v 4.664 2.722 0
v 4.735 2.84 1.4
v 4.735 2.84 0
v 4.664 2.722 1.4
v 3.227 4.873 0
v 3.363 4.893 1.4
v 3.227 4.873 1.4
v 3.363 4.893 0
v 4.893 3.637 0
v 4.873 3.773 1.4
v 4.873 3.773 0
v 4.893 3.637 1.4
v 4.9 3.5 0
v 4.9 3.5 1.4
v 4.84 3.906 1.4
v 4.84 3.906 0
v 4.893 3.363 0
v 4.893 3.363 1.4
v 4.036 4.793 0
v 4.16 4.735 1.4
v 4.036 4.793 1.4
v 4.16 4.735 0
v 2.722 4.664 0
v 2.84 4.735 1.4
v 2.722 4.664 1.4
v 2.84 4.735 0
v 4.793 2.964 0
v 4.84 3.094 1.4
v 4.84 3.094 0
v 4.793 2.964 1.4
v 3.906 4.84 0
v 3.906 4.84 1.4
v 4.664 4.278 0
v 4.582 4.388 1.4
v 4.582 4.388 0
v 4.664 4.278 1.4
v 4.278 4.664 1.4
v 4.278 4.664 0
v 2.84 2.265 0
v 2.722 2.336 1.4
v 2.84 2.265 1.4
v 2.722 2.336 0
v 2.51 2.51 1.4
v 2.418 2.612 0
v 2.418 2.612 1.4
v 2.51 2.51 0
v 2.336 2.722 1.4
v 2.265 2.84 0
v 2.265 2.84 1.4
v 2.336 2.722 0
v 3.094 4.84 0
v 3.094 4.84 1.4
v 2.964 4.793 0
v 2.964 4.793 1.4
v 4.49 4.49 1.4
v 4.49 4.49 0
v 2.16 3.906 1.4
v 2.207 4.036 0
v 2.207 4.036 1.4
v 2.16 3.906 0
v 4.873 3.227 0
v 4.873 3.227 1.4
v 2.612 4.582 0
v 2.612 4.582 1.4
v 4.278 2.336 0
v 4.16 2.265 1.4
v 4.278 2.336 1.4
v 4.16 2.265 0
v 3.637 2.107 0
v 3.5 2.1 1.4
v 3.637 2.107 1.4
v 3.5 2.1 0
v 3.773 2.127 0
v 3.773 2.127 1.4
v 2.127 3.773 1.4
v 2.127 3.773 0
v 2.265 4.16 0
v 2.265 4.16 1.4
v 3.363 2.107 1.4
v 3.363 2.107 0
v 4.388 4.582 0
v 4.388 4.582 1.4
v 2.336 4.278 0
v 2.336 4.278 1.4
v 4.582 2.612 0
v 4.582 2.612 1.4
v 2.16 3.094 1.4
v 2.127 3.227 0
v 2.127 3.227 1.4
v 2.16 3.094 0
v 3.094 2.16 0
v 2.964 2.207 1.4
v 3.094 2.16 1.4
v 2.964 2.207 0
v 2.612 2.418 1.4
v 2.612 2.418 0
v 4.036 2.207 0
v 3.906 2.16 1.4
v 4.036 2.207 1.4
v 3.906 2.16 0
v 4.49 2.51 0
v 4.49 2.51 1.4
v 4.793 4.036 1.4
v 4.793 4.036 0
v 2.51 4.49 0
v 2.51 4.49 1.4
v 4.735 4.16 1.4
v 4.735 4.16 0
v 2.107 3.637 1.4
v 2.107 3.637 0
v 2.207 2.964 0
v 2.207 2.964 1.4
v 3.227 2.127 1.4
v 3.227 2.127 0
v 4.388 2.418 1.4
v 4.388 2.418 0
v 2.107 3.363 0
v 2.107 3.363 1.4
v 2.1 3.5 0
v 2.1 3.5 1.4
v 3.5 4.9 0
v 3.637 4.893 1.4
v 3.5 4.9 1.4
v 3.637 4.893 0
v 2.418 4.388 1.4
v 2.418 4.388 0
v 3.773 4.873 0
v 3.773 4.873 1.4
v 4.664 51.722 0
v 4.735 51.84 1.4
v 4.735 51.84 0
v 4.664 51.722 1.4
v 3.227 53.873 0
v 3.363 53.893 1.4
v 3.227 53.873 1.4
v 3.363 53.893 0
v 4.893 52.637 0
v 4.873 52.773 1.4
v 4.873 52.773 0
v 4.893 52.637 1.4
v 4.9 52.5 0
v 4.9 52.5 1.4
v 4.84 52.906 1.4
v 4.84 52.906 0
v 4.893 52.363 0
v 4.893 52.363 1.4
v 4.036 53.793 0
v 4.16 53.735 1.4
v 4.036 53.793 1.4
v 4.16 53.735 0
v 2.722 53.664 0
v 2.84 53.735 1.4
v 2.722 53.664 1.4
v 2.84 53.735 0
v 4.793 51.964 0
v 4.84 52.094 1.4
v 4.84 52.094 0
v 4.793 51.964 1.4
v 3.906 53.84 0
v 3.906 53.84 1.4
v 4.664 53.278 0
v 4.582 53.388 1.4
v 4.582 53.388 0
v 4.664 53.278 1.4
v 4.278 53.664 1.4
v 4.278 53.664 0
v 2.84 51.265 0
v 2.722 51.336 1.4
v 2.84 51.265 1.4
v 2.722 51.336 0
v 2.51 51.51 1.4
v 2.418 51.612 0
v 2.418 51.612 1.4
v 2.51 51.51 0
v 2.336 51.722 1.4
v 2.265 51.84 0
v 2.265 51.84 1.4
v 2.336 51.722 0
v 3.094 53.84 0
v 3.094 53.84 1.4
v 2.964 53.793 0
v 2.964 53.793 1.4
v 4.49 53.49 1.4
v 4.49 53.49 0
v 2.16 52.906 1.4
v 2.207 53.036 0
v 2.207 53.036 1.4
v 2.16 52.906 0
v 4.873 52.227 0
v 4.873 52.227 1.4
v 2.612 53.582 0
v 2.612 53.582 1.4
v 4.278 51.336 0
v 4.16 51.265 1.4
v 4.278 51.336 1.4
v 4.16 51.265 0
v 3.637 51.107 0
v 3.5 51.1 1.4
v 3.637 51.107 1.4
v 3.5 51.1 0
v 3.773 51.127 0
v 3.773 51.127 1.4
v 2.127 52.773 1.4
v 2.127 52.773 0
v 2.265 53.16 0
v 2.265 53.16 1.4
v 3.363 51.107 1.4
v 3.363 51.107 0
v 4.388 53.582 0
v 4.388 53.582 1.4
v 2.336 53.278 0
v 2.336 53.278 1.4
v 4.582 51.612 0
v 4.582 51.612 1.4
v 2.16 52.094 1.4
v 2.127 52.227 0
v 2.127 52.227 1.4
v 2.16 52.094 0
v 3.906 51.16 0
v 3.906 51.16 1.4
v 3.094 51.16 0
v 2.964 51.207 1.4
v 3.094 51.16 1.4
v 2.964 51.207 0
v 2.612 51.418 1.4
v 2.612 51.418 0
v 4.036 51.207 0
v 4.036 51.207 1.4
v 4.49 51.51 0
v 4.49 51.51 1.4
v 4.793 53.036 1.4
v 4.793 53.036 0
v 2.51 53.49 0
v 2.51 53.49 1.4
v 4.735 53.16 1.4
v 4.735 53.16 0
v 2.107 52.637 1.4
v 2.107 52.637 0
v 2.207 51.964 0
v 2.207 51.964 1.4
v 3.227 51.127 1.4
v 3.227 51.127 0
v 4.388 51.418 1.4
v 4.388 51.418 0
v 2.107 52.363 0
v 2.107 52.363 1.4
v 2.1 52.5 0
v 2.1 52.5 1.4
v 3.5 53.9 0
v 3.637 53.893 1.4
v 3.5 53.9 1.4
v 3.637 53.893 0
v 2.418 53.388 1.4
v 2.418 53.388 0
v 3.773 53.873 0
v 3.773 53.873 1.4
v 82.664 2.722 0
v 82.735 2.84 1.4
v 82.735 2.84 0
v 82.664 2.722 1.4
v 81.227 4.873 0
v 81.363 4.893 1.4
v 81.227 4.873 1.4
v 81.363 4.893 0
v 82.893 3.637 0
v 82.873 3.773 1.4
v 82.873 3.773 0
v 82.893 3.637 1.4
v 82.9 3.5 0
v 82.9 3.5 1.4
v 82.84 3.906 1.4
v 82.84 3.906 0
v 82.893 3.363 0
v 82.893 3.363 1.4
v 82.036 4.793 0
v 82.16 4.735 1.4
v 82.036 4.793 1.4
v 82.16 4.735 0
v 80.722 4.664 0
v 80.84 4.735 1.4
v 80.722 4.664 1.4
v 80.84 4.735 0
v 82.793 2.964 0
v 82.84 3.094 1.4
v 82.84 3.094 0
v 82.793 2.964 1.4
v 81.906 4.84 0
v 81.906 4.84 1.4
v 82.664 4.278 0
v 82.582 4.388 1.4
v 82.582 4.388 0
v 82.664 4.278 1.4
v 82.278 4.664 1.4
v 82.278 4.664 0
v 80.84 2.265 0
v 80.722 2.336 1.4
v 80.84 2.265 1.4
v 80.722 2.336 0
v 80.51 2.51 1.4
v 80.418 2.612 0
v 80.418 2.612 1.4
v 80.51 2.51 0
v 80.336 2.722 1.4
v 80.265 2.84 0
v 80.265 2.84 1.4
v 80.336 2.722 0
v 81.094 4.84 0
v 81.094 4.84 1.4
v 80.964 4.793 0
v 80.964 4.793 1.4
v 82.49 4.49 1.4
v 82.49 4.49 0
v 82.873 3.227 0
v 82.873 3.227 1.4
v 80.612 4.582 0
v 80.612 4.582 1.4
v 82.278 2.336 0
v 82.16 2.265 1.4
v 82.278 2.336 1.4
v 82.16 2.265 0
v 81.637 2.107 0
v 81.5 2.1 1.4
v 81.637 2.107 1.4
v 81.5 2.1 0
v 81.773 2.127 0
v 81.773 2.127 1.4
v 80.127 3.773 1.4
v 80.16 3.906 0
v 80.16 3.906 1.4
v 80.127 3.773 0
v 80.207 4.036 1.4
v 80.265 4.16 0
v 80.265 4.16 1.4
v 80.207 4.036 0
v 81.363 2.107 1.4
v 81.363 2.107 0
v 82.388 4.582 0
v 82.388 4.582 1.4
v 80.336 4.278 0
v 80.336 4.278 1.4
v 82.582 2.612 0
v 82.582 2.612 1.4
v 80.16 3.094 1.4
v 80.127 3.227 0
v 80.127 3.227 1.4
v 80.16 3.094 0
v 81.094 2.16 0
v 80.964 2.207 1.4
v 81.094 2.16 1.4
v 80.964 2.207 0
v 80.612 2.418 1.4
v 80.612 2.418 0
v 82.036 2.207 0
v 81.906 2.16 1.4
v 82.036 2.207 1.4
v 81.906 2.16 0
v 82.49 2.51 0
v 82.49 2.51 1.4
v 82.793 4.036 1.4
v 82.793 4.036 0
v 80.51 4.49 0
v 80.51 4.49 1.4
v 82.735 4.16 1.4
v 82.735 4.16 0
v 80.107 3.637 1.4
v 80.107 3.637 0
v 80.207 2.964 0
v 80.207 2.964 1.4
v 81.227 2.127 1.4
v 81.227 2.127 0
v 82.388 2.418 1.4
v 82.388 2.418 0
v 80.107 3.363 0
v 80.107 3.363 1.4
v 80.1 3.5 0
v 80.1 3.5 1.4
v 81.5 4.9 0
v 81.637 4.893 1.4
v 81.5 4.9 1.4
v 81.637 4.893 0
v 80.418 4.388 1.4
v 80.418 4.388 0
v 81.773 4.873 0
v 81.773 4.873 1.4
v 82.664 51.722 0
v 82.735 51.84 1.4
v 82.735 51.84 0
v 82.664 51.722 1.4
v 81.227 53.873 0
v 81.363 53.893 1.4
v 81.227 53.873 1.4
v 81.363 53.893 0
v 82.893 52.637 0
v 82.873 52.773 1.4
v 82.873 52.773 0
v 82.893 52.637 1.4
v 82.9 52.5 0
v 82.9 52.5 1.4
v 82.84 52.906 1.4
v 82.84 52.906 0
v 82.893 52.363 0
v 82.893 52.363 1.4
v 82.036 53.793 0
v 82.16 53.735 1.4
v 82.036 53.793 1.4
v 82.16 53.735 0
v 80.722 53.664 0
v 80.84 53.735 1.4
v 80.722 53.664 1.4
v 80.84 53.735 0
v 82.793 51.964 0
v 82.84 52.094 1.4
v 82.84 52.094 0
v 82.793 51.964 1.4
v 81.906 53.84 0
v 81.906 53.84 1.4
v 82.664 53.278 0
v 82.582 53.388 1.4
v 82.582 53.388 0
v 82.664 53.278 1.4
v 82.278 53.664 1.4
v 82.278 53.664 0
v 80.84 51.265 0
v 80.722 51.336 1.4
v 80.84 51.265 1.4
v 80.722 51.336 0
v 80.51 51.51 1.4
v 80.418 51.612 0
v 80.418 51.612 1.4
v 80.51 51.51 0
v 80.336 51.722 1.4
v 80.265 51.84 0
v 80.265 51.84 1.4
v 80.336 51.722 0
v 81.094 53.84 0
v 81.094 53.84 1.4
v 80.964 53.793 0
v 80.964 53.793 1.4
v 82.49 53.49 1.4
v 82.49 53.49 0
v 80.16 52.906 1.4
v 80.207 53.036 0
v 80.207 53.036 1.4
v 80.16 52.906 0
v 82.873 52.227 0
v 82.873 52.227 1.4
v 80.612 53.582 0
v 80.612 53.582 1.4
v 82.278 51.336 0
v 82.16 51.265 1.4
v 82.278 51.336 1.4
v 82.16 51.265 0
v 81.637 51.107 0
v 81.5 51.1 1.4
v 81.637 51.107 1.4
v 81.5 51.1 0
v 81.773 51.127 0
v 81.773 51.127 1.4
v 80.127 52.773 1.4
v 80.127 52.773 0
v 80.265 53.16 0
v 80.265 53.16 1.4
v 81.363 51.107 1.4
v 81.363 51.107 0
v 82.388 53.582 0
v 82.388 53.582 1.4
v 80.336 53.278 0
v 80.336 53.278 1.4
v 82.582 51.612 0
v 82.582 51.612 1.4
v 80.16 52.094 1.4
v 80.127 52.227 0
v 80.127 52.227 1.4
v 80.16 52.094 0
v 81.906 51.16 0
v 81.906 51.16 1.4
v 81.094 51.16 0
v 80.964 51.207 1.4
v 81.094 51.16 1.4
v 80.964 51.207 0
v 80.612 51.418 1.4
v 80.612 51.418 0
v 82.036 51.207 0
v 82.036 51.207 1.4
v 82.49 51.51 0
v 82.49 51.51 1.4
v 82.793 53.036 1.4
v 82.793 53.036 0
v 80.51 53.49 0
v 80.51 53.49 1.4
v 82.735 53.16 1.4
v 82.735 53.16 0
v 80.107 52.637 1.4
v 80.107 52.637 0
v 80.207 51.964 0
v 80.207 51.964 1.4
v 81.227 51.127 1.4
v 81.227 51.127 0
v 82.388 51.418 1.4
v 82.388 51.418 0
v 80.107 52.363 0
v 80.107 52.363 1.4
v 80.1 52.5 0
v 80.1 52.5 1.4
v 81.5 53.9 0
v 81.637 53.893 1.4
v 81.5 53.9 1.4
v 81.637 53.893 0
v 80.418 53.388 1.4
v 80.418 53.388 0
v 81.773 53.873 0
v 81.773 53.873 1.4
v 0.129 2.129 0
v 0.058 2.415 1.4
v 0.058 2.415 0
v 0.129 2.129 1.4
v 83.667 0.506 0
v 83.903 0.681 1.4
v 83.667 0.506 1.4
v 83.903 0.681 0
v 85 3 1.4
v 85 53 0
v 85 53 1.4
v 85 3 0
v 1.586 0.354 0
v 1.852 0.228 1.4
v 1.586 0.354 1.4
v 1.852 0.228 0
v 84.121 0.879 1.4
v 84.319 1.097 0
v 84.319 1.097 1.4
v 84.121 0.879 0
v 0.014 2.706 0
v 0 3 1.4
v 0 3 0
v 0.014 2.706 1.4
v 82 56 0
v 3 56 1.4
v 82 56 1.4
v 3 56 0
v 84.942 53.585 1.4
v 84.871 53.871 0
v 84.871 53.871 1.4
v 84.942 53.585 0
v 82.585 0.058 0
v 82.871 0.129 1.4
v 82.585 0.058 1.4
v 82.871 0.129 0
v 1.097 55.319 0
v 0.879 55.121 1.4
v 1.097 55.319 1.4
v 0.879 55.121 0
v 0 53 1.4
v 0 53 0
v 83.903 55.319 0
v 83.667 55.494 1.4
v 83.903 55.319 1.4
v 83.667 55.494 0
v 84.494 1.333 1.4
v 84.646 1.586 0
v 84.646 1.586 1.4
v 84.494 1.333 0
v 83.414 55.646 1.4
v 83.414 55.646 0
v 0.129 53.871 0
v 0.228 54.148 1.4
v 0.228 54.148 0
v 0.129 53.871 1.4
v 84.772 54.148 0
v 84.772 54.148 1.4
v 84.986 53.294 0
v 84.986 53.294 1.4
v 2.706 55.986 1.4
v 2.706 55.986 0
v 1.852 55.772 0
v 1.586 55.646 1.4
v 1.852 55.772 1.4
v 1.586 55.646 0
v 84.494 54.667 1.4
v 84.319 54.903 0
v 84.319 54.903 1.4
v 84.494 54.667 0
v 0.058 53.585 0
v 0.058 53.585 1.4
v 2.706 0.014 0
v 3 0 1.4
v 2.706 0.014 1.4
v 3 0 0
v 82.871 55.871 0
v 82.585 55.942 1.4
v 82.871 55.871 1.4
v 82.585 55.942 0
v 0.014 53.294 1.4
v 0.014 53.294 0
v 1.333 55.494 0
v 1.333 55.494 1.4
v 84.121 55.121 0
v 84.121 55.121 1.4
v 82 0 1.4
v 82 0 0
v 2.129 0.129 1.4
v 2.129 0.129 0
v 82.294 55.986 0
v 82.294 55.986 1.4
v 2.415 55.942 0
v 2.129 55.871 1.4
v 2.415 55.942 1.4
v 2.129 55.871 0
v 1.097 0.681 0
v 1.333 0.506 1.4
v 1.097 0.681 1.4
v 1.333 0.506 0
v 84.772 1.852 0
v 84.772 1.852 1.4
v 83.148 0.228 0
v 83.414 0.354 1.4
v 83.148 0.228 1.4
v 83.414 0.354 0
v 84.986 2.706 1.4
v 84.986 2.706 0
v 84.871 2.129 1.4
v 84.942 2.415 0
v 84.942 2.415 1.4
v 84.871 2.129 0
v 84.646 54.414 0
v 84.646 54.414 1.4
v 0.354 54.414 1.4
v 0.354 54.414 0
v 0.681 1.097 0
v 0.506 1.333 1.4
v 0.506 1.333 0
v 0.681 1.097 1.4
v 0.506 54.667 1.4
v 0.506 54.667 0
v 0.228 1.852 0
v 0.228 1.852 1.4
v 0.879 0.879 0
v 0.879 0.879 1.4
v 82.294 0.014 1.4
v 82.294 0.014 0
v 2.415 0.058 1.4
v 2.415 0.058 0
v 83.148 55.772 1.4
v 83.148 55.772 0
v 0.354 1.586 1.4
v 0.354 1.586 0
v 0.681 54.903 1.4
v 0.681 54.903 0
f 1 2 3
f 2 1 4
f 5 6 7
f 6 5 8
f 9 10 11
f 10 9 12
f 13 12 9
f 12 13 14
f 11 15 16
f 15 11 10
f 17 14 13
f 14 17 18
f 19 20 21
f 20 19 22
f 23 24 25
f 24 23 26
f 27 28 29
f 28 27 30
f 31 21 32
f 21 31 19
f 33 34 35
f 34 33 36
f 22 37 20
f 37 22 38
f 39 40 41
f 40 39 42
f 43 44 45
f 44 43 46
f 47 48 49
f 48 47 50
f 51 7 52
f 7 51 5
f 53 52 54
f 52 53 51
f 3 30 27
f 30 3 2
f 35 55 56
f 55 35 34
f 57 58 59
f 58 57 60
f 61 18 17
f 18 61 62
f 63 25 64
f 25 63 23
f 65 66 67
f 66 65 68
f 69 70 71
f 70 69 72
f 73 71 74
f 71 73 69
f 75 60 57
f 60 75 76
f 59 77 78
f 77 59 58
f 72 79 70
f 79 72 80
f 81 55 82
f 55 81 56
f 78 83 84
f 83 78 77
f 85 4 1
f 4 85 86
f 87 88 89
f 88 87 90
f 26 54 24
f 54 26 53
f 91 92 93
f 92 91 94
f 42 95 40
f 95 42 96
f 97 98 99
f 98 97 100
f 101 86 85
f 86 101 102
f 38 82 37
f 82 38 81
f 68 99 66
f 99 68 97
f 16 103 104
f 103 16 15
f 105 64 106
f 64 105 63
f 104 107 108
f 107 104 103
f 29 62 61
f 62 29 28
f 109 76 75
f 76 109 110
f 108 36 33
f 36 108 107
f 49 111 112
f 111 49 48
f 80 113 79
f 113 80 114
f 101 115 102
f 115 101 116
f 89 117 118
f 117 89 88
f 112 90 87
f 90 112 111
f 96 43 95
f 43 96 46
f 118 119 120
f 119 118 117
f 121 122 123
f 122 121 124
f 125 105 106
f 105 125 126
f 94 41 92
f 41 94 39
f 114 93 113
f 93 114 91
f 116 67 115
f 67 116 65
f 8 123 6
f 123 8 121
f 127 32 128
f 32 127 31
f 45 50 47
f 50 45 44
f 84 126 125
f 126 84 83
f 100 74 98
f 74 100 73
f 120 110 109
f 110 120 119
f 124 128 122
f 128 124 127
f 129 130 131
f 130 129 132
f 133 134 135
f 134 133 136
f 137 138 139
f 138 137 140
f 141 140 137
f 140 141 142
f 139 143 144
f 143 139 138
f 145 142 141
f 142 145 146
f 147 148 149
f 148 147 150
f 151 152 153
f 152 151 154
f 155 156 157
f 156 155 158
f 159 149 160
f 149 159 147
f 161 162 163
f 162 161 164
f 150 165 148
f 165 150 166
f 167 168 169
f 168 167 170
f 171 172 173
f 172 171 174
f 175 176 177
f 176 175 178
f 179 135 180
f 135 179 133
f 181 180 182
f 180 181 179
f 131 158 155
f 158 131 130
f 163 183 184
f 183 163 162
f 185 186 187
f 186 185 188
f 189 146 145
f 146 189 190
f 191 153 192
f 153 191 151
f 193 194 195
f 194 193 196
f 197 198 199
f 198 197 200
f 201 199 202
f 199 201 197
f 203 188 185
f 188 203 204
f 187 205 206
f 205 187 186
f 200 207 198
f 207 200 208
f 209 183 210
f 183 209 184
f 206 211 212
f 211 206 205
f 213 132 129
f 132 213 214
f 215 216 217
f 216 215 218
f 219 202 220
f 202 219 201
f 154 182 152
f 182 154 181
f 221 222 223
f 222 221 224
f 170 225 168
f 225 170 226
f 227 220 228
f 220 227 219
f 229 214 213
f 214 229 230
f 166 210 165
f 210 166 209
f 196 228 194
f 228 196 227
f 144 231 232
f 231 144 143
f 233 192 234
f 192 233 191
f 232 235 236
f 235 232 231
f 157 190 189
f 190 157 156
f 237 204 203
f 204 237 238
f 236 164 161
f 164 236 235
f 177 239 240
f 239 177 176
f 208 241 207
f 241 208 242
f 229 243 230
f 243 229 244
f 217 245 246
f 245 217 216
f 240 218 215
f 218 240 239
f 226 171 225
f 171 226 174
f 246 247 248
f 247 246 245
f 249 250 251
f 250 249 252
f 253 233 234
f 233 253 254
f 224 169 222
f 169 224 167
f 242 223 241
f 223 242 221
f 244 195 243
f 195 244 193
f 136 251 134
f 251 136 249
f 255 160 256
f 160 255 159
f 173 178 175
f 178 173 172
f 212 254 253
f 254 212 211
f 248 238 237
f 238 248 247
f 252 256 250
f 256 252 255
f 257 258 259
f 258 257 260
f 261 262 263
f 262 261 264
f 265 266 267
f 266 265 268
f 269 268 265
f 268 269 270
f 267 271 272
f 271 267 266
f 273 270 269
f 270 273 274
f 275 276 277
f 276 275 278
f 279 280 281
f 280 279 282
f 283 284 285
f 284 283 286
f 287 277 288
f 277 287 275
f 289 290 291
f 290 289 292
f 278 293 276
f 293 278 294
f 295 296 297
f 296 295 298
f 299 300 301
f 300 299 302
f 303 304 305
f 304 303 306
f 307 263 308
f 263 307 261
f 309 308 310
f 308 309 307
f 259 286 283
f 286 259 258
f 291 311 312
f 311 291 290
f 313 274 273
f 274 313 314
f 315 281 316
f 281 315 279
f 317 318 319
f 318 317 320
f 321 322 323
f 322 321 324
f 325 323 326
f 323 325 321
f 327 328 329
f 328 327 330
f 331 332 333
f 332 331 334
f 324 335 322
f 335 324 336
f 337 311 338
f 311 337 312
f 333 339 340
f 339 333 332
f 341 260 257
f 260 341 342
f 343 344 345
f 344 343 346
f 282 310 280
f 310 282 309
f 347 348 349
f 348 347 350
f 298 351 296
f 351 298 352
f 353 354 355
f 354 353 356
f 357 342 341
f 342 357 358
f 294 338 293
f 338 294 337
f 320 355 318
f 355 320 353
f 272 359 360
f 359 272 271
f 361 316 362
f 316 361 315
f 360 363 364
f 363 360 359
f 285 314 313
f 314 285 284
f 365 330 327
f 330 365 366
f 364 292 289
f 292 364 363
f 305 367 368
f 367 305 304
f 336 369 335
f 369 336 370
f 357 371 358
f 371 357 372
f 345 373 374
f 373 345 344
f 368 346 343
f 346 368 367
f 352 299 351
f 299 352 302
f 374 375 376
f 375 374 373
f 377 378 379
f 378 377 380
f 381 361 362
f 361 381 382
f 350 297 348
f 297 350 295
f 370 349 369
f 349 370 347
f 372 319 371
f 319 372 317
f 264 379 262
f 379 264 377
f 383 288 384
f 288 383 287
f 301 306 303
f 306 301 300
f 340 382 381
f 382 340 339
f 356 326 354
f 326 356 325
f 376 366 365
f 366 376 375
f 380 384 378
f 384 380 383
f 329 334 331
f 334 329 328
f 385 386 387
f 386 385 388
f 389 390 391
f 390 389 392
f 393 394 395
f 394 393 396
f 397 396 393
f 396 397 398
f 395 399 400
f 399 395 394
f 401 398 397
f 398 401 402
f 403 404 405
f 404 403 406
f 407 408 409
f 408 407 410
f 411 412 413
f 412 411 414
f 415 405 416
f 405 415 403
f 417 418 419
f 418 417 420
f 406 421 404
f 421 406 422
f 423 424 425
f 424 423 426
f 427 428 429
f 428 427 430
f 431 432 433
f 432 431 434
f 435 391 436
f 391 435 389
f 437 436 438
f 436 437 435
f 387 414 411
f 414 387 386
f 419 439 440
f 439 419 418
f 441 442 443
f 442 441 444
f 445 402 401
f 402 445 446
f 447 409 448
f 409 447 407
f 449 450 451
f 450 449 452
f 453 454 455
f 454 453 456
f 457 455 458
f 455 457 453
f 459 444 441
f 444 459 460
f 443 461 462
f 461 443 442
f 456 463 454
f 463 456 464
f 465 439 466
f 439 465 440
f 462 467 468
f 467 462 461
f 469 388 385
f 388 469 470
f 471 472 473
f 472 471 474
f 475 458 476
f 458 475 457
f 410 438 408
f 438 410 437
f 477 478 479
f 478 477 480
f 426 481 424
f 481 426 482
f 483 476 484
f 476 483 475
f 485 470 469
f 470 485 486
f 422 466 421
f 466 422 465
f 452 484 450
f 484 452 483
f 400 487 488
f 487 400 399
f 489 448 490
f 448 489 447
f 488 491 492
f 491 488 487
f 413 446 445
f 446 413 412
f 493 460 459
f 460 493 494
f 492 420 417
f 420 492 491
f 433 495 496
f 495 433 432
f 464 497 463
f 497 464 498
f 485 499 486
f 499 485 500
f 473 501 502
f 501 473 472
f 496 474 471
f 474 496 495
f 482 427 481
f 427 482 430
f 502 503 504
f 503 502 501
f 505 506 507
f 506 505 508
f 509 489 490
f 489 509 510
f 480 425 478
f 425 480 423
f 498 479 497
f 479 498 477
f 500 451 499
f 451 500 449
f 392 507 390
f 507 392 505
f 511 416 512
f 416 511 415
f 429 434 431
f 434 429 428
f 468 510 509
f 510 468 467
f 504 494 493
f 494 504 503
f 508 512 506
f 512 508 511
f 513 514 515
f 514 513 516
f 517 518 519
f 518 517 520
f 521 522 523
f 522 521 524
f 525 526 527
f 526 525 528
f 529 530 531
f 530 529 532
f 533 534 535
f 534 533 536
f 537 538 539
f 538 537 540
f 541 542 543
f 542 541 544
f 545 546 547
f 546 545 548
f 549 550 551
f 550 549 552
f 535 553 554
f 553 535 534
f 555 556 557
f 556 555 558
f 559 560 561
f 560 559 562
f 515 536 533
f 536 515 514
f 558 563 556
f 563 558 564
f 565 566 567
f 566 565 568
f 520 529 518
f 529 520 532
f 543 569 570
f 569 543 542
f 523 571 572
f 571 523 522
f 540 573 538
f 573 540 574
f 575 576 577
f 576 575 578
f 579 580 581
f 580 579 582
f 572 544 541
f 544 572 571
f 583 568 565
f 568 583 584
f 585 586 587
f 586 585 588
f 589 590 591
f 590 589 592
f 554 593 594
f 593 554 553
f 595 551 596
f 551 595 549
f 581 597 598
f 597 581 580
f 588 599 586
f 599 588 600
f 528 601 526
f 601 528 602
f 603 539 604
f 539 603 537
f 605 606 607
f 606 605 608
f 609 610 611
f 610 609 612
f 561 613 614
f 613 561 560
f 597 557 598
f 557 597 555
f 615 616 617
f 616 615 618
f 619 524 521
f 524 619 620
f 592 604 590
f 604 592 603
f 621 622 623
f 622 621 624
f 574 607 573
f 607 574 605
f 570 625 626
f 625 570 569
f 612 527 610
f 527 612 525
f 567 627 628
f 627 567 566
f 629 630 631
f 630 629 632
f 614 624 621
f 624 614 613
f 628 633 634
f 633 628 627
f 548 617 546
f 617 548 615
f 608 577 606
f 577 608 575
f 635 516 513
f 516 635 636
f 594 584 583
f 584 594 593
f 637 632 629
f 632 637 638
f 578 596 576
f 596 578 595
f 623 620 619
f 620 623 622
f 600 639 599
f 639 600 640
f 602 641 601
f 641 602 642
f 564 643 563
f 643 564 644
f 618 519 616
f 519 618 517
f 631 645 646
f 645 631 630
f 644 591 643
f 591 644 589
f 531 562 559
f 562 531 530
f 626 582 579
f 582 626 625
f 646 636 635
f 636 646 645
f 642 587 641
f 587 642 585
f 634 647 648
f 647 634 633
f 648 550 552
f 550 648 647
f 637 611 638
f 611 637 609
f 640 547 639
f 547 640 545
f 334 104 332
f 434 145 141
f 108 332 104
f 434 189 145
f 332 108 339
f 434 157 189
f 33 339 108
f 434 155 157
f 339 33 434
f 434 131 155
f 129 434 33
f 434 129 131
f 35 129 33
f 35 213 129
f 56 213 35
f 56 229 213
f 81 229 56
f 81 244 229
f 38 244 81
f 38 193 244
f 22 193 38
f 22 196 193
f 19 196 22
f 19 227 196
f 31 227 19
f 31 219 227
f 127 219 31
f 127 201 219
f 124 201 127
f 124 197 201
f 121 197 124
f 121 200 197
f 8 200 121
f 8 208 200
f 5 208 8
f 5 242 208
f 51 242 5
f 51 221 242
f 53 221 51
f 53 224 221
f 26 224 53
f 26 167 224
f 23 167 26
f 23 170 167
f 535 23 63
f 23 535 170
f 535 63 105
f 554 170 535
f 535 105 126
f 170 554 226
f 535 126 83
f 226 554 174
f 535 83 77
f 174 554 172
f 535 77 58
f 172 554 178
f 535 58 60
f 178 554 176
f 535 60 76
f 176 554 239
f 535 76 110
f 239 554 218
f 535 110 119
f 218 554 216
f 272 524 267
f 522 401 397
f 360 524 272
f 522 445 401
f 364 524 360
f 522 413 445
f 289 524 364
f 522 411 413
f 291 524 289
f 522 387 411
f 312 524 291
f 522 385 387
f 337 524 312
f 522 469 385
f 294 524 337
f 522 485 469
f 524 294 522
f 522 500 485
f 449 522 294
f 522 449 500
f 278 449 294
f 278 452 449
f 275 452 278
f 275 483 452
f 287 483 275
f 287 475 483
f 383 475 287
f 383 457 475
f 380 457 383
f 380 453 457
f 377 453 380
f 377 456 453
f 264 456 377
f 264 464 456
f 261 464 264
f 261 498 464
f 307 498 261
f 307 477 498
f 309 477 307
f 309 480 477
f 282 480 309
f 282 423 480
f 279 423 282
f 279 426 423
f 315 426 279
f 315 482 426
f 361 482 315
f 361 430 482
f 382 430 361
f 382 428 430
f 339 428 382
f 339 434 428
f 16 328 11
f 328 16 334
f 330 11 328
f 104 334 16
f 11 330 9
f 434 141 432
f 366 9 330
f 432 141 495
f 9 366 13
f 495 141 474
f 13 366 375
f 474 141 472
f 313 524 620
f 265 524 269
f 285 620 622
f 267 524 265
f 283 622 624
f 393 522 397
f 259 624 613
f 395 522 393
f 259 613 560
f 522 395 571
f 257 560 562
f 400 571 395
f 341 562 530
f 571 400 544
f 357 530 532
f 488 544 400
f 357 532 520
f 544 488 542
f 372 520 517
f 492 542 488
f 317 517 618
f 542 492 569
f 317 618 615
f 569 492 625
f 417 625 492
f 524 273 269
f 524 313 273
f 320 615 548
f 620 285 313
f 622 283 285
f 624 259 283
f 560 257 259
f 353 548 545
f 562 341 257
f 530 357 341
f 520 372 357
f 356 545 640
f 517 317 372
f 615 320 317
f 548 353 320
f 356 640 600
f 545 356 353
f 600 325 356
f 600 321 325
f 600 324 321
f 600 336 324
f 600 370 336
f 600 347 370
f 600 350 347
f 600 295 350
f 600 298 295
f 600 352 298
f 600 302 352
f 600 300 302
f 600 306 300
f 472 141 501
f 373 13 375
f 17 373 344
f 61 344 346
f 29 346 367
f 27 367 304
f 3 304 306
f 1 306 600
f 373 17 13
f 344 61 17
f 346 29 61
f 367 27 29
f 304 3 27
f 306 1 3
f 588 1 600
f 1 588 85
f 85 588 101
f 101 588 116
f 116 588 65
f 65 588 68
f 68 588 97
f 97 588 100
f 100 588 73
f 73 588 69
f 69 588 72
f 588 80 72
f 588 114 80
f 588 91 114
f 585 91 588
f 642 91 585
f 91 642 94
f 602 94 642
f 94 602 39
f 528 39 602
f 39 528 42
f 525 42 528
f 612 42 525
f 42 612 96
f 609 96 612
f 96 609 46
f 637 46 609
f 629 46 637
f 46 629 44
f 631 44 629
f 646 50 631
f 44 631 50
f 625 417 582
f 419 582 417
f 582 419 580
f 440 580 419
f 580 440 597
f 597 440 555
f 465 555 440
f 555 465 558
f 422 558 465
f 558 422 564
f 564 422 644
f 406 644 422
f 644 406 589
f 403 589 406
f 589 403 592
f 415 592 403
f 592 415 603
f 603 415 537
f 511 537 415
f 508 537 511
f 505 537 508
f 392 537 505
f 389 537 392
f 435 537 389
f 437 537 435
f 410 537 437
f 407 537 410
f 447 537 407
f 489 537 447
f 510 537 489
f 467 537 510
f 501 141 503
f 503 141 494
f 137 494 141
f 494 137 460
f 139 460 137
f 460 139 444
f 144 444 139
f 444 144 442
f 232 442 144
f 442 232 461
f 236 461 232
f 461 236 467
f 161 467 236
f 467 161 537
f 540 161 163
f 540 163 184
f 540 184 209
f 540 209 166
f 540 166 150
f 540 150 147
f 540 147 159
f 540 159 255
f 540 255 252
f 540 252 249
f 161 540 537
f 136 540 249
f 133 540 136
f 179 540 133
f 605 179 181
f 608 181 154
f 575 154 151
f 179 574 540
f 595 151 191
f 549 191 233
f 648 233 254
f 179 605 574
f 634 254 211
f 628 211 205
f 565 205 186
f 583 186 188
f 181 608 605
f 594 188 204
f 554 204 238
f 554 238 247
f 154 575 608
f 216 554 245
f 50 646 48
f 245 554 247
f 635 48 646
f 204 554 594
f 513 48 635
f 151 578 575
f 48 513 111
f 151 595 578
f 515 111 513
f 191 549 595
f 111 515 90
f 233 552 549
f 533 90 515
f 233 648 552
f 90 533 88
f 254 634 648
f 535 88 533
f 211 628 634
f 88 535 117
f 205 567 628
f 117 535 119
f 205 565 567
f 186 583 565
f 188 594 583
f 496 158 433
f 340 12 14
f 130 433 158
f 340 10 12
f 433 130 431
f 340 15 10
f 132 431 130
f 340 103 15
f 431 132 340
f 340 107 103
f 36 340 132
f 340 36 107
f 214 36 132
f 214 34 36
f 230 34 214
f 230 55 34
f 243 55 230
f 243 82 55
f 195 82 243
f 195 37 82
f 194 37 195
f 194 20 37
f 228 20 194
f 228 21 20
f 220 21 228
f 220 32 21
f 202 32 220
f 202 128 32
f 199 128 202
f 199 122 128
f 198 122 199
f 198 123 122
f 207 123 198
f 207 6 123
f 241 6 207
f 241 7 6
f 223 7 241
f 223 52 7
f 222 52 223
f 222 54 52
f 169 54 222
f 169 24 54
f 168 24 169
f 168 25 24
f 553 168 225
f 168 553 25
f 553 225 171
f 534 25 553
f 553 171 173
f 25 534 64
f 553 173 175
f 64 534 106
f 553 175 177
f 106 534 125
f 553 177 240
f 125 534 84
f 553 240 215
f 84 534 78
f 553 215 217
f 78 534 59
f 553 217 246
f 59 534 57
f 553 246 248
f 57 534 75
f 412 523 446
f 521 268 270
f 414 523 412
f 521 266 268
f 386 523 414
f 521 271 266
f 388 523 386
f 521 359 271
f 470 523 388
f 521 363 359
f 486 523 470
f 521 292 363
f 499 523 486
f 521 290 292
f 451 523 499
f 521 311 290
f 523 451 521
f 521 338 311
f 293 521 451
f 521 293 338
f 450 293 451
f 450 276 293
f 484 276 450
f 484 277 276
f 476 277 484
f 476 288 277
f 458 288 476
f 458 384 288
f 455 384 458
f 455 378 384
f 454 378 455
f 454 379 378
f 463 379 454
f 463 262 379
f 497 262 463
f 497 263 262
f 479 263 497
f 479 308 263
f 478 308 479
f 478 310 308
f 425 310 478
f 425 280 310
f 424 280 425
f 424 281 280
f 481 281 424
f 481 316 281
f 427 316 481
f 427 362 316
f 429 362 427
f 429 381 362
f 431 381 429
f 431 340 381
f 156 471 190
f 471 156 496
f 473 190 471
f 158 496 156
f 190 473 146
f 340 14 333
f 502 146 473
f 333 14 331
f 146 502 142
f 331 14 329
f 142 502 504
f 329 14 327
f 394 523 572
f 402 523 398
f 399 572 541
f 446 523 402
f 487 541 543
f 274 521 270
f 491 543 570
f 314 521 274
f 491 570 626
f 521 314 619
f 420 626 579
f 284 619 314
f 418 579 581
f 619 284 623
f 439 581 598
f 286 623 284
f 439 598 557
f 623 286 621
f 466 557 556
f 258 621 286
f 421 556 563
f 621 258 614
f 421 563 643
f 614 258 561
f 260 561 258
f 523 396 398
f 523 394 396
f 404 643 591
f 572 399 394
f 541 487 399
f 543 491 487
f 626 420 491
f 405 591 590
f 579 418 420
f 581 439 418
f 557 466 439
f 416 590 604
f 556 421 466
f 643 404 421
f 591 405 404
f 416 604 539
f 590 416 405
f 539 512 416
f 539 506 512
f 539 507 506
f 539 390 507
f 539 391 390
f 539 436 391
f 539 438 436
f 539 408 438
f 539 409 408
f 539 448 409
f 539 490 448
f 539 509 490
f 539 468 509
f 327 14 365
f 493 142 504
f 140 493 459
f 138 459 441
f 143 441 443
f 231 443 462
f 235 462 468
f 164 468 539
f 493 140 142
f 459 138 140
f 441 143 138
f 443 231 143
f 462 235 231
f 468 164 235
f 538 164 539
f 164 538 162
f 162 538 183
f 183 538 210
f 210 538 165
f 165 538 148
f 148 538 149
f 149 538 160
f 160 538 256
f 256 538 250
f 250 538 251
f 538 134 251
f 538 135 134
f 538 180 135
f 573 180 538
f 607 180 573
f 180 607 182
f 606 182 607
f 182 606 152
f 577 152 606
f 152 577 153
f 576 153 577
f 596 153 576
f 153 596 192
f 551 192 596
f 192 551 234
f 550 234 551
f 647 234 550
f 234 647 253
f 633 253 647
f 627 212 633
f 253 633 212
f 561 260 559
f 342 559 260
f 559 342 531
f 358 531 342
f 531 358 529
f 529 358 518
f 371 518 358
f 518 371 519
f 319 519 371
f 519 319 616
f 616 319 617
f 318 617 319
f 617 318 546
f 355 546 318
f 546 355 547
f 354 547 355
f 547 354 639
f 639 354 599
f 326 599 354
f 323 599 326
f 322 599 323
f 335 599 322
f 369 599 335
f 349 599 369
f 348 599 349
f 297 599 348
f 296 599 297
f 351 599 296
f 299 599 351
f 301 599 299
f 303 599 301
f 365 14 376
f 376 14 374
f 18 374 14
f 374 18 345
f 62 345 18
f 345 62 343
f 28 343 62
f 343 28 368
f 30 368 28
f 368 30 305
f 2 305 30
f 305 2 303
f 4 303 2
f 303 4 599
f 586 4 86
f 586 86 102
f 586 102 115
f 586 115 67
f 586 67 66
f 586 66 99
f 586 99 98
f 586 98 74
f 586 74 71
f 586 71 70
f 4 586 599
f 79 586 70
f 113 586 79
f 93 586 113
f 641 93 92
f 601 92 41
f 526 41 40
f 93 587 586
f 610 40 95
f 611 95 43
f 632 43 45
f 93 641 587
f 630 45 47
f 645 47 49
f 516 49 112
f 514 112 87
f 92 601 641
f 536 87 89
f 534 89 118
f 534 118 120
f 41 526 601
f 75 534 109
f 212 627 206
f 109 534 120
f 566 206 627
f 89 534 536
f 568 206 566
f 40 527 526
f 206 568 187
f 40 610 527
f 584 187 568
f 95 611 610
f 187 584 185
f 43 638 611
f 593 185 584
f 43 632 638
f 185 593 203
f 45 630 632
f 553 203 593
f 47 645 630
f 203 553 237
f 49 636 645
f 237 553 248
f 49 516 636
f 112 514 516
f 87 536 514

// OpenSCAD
$fn = 64;

// Single-board computer overall size (PCB only)
board_length = 85.0;
board_width  = 56.0;
board_thick  = 1.4;

// Small overlap to guarantee watertight unions/differences
eps = 0.2;

// Rounded corner radius
corner_r = 3.0;

// Mounting holes (approximate 4-hole pattern)
hole_d = 2.8;
hole_edge_x = 3.5;
hole_edge_y = 3.5;

// --- Helpers ---
module rounded_board_2d(L, W, R) {
    hull() {
        translate([R,     R])     circle(r=R);
        translate([L - R, R])     circle(r=R);
        translate([R,     W - R]) circle(r=R);
        translate([L - R, W - R]) circle(r=R);
    }
}

module pcb_only() {
    difference() {
        linear_extrude(height=board_thick)
            rounded_board_2d(board_length, board_width, corner_r);

        // 4 mounting holes (through)
        for (x = [hole_edge_x, board_length - hole_edge_x])
            for (y = [hole_edge_y, board_width - hole_edge_y])
                translate([x, y, -eps])
                    cylinder(h=board_thick + 2*eps, d=hole_d);
    }
}

// --- Main model: ONE connected solid, correct PCB thickness ---
union() {
    pcb_only();
}
